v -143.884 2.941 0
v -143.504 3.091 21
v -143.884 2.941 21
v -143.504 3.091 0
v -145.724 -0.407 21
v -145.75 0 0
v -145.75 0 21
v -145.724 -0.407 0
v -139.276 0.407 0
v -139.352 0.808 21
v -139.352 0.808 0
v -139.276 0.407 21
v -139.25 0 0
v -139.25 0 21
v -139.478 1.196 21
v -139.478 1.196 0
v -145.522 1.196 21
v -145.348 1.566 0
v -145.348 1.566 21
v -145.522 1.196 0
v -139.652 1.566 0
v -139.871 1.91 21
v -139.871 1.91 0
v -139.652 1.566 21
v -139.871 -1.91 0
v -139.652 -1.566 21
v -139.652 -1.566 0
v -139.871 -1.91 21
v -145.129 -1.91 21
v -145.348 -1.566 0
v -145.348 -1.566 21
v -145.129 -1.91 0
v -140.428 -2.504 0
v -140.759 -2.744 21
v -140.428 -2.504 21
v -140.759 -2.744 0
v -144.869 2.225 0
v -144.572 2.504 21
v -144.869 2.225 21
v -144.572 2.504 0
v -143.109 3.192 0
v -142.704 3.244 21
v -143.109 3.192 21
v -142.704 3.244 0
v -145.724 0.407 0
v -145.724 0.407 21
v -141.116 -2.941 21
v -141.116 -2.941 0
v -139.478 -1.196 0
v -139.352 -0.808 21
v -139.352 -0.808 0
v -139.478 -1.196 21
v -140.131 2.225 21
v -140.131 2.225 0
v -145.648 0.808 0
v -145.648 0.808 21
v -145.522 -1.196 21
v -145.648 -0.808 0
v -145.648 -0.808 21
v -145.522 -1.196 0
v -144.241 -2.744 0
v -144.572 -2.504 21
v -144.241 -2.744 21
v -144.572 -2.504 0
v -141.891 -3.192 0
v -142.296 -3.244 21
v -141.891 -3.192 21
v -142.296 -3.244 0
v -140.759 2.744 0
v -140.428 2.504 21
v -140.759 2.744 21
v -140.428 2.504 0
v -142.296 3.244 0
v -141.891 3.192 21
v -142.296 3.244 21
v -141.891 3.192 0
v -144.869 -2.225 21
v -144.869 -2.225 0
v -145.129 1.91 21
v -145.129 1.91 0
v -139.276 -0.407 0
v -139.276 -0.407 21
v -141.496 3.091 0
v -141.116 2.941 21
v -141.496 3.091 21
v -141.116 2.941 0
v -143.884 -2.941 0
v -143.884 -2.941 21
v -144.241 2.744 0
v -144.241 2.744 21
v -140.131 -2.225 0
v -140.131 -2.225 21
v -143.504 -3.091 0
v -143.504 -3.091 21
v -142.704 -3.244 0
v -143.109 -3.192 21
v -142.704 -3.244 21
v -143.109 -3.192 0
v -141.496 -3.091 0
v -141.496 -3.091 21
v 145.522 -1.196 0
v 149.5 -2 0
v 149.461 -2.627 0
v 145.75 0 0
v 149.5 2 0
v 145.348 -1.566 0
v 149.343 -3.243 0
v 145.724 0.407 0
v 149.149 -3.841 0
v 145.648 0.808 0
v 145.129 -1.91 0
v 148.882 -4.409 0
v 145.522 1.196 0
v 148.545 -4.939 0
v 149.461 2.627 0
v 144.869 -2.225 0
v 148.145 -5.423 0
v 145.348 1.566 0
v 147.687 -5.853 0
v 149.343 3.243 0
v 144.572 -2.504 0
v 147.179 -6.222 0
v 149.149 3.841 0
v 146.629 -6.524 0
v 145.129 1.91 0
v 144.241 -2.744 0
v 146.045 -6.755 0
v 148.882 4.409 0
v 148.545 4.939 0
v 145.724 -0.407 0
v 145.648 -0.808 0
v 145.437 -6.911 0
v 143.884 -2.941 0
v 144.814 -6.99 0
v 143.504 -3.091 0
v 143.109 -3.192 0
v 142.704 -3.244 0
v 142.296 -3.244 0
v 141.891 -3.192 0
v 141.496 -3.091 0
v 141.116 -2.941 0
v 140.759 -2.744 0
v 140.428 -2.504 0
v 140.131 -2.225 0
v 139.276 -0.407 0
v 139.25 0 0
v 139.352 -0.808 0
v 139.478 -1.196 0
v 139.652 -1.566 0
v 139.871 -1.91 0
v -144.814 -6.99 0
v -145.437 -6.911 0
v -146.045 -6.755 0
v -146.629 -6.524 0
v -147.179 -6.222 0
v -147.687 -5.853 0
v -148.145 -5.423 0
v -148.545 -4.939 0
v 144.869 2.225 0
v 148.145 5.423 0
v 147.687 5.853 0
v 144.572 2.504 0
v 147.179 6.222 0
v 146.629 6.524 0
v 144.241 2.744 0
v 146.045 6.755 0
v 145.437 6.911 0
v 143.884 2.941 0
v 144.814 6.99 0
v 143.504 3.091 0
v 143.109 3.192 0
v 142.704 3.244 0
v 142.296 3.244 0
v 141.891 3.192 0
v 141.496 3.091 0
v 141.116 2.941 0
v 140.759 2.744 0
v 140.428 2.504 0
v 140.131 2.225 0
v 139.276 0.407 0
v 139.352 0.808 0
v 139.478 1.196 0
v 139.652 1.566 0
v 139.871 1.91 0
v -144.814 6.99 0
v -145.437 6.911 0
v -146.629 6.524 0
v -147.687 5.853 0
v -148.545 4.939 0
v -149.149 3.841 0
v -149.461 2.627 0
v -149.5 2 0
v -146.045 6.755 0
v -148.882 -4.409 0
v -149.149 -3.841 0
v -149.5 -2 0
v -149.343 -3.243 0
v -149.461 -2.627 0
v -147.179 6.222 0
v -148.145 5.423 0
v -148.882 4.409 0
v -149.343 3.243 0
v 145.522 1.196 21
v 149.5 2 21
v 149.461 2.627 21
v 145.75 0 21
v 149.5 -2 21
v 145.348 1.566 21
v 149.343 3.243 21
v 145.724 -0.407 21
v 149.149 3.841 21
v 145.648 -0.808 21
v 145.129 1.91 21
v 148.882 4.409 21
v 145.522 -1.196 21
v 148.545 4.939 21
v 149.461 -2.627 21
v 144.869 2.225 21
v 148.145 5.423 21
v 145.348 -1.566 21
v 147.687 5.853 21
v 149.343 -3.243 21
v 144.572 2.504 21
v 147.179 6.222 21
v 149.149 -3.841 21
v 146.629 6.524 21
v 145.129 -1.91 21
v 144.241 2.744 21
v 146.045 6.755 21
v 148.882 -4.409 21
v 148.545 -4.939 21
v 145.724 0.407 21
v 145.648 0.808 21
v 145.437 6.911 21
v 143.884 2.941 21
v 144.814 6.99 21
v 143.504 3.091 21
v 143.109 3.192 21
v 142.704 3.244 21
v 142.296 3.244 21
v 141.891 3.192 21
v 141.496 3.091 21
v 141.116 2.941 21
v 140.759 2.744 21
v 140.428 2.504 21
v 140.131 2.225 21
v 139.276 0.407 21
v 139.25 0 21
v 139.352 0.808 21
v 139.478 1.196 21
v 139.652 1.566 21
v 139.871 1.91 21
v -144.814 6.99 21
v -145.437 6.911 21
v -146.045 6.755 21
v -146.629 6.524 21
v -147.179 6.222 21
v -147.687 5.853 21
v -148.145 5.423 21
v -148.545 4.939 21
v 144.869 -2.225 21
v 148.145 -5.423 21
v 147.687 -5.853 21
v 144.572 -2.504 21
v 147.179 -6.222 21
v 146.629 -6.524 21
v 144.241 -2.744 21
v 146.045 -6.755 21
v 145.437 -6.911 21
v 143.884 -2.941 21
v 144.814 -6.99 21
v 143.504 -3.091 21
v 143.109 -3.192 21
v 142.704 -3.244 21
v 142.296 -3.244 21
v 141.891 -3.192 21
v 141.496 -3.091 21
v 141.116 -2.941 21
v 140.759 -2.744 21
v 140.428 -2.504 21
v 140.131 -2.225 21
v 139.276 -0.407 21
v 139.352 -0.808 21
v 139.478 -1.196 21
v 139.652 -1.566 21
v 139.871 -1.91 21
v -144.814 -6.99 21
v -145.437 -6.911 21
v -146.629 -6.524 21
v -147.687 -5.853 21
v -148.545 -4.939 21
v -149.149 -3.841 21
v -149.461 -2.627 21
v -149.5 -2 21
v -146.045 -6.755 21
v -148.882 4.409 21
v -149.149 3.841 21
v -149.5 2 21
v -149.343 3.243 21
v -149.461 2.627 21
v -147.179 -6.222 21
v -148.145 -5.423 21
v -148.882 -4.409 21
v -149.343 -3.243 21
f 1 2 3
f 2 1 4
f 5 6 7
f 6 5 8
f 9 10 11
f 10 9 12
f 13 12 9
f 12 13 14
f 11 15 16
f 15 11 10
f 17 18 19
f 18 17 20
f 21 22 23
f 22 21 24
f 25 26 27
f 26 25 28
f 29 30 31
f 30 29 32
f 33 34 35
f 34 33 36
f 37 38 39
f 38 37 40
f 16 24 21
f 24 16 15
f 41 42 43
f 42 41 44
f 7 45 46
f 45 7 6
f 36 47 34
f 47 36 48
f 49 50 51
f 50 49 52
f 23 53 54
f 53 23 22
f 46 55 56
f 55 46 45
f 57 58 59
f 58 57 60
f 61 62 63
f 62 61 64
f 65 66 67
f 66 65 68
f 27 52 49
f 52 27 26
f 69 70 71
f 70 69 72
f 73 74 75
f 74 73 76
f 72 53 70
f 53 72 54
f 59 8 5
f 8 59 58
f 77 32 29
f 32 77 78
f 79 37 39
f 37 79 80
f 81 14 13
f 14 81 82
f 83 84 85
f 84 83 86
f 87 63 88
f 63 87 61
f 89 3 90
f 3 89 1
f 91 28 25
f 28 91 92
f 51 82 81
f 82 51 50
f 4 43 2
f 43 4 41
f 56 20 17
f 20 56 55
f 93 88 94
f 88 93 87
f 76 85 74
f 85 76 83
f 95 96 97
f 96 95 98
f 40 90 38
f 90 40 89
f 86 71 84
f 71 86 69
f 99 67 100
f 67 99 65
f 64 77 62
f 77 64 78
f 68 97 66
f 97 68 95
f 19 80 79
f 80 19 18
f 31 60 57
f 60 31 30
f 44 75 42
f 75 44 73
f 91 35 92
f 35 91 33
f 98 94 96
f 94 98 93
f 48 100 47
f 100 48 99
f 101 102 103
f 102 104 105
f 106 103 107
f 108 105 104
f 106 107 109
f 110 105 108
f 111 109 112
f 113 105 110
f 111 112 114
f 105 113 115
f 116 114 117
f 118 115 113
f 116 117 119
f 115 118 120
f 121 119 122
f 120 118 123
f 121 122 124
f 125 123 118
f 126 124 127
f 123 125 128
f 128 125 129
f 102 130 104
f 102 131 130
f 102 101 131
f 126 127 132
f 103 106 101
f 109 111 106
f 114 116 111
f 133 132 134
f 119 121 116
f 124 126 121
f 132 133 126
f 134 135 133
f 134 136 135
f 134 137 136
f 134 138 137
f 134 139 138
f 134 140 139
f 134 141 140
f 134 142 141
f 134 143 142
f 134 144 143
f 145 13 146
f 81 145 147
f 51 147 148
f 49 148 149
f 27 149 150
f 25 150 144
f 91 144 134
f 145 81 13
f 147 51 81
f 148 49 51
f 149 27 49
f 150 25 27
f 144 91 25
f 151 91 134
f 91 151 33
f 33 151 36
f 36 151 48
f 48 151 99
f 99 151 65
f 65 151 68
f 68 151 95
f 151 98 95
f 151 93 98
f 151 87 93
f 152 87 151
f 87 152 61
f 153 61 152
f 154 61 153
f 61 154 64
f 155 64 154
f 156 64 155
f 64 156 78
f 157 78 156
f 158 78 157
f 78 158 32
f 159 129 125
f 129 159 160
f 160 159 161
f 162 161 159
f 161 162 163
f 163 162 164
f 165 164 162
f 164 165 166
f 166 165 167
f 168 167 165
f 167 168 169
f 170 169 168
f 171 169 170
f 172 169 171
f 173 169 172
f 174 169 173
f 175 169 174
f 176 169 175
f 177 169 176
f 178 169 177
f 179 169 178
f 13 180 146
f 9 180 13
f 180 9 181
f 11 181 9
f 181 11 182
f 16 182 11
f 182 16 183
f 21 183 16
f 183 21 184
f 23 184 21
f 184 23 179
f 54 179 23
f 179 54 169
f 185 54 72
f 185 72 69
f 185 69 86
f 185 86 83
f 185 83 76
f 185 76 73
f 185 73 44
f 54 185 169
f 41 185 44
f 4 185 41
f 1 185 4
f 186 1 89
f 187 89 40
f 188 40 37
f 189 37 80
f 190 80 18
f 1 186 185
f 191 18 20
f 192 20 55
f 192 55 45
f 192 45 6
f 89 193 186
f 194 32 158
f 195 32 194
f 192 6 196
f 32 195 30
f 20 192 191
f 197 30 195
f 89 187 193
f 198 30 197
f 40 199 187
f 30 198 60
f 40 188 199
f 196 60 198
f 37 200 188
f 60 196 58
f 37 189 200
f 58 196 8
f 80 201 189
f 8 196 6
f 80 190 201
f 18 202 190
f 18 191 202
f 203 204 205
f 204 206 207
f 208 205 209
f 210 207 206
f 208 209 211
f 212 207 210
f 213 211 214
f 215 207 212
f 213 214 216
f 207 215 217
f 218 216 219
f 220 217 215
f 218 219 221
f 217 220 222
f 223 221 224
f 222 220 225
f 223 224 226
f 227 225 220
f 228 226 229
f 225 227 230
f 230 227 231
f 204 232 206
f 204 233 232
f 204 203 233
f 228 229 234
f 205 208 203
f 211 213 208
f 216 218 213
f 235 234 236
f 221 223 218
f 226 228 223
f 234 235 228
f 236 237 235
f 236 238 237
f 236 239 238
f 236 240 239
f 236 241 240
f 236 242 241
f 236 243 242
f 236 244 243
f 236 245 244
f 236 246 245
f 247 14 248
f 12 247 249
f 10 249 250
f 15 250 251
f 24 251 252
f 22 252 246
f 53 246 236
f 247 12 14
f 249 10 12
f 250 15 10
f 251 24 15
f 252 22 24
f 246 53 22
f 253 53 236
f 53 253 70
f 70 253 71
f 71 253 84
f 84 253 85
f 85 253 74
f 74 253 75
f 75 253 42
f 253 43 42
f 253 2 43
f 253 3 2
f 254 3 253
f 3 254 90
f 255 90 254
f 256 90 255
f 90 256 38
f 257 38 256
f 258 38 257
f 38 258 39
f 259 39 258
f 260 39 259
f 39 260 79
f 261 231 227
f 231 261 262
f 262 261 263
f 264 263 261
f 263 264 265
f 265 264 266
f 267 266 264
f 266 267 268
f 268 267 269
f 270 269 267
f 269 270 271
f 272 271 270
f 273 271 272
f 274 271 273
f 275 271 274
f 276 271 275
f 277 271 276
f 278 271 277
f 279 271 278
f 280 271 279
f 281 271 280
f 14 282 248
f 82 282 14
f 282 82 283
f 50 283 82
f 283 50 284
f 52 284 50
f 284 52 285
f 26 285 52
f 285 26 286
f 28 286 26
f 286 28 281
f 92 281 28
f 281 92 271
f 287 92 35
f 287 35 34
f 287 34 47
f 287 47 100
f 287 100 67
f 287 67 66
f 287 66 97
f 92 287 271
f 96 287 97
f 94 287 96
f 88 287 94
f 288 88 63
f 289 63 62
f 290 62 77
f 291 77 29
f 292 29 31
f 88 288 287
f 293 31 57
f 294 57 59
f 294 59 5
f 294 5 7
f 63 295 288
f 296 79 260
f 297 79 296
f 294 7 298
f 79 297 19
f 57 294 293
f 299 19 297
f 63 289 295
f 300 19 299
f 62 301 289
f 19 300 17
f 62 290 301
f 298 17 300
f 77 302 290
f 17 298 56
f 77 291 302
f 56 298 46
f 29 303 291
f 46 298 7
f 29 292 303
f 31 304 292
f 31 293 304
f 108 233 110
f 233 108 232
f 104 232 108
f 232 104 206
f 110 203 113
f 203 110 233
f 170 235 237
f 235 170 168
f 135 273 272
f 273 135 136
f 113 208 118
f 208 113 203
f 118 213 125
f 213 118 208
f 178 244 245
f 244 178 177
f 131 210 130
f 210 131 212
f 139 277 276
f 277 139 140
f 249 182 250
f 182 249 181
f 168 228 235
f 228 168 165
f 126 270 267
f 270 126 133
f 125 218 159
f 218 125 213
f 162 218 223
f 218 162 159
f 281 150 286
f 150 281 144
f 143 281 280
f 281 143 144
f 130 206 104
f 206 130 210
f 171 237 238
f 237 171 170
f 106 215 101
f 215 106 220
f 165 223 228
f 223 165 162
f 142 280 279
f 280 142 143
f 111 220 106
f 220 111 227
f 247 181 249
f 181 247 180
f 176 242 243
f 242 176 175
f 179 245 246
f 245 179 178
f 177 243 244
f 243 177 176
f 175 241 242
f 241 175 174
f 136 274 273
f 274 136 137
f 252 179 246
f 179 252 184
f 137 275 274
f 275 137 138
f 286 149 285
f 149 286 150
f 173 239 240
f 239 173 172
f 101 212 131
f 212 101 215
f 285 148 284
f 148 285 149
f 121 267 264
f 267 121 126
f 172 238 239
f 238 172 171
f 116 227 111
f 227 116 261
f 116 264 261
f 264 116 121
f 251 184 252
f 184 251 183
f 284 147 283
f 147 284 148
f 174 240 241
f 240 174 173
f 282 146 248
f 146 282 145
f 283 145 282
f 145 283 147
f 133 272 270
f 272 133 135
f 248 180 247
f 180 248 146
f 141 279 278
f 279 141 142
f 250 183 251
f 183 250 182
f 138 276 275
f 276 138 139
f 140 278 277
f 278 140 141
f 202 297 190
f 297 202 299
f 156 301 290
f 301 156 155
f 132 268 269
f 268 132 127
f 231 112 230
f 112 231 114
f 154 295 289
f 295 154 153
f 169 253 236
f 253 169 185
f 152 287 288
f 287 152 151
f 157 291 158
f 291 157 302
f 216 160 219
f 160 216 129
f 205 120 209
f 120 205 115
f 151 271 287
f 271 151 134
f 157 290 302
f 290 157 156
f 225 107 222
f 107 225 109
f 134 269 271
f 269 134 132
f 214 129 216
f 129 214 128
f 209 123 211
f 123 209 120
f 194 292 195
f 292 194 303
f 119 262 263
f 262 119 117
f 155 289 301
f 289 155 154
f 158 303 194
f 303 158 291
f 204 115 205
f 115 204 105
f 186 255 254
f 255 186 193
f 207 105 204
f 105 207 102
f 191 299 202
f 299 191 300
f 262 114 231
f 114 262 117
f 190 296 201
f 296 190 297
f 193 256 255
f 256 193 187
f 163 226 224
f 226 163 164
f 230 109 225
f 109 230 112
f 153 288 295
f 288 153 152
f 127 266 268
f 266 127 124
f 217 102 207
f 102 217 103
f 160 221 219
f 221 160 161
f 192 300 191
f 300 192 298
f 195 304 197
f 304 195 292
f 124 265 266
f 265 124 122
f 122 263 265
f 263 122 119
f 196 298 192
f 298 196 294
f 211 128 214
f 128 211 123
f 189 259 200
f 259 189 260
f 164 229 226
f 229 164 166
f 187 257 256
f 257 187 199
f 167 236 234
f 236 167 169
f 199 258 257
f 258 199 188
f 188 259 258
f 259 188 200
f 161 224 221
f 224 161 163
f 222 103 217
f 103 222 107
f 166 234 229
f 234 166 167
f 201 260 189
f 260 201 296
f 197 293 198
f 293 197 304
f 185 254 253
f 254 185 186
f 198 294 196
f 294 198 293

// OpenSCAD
$fn = 50;


difference() {
	union() {
		hull() {
			translate(v = [-144.5000000000, 2.0000000000, 0]) {
				cylinder(h = 21, r = 5);
			}
			translate(v = [144.5000000000, 2.0000000000, 0]) {
				cylinder(h = 21, r = 5);
			}
			translate(v = [-144.5000000000, -2.0000000000, 0]) {
				cylinder(h = 21, r = 5);
			}
			translate(v = [144.5000000000, -2.0000000000, 0]) {
				cylinder(h = 21, r = 5);
			}
		}
	}
	union() {
		translate(v = [-142.5000000000, 0.0000000000, 0]) {
			cylinder(h = 21, r = 3.2500000000);
		}
		translate(v = [142.5000000000, 0.0000000000, 0]) {
			cylinder(h = 21, r = 3.2500000000);
		}
		translate(v = [-142.5000000000, 0.0000000000, 0]) {
			cylinder(h = 21, r = 1.8000000000);
		}
		translate(v = [142.5000000000, 0.0000000000, 0]) {
			cylinder(h = 21, r = 1.8000000000);
		}
		translate(v = [-142.5000000000, 0.0000000000, 0]) {
			cylinder(h = 21, r = 1.8000000000);
		}
		translate(v = [142.5000000000, 0.0000000000, 0]) {
			cylinder(h = 21, r = 1.8000000000);
		}
		translate(v = [-142.5000000000, 0.0000000000, 0]) {
			cylinder(h = 21, r = 1.8000000000);
		}
		translate(v = [142.5000000000, 0.0000000000, 0]) {
			cylinder(h = 21, r = 1.8000000000);
		}
	}
}
